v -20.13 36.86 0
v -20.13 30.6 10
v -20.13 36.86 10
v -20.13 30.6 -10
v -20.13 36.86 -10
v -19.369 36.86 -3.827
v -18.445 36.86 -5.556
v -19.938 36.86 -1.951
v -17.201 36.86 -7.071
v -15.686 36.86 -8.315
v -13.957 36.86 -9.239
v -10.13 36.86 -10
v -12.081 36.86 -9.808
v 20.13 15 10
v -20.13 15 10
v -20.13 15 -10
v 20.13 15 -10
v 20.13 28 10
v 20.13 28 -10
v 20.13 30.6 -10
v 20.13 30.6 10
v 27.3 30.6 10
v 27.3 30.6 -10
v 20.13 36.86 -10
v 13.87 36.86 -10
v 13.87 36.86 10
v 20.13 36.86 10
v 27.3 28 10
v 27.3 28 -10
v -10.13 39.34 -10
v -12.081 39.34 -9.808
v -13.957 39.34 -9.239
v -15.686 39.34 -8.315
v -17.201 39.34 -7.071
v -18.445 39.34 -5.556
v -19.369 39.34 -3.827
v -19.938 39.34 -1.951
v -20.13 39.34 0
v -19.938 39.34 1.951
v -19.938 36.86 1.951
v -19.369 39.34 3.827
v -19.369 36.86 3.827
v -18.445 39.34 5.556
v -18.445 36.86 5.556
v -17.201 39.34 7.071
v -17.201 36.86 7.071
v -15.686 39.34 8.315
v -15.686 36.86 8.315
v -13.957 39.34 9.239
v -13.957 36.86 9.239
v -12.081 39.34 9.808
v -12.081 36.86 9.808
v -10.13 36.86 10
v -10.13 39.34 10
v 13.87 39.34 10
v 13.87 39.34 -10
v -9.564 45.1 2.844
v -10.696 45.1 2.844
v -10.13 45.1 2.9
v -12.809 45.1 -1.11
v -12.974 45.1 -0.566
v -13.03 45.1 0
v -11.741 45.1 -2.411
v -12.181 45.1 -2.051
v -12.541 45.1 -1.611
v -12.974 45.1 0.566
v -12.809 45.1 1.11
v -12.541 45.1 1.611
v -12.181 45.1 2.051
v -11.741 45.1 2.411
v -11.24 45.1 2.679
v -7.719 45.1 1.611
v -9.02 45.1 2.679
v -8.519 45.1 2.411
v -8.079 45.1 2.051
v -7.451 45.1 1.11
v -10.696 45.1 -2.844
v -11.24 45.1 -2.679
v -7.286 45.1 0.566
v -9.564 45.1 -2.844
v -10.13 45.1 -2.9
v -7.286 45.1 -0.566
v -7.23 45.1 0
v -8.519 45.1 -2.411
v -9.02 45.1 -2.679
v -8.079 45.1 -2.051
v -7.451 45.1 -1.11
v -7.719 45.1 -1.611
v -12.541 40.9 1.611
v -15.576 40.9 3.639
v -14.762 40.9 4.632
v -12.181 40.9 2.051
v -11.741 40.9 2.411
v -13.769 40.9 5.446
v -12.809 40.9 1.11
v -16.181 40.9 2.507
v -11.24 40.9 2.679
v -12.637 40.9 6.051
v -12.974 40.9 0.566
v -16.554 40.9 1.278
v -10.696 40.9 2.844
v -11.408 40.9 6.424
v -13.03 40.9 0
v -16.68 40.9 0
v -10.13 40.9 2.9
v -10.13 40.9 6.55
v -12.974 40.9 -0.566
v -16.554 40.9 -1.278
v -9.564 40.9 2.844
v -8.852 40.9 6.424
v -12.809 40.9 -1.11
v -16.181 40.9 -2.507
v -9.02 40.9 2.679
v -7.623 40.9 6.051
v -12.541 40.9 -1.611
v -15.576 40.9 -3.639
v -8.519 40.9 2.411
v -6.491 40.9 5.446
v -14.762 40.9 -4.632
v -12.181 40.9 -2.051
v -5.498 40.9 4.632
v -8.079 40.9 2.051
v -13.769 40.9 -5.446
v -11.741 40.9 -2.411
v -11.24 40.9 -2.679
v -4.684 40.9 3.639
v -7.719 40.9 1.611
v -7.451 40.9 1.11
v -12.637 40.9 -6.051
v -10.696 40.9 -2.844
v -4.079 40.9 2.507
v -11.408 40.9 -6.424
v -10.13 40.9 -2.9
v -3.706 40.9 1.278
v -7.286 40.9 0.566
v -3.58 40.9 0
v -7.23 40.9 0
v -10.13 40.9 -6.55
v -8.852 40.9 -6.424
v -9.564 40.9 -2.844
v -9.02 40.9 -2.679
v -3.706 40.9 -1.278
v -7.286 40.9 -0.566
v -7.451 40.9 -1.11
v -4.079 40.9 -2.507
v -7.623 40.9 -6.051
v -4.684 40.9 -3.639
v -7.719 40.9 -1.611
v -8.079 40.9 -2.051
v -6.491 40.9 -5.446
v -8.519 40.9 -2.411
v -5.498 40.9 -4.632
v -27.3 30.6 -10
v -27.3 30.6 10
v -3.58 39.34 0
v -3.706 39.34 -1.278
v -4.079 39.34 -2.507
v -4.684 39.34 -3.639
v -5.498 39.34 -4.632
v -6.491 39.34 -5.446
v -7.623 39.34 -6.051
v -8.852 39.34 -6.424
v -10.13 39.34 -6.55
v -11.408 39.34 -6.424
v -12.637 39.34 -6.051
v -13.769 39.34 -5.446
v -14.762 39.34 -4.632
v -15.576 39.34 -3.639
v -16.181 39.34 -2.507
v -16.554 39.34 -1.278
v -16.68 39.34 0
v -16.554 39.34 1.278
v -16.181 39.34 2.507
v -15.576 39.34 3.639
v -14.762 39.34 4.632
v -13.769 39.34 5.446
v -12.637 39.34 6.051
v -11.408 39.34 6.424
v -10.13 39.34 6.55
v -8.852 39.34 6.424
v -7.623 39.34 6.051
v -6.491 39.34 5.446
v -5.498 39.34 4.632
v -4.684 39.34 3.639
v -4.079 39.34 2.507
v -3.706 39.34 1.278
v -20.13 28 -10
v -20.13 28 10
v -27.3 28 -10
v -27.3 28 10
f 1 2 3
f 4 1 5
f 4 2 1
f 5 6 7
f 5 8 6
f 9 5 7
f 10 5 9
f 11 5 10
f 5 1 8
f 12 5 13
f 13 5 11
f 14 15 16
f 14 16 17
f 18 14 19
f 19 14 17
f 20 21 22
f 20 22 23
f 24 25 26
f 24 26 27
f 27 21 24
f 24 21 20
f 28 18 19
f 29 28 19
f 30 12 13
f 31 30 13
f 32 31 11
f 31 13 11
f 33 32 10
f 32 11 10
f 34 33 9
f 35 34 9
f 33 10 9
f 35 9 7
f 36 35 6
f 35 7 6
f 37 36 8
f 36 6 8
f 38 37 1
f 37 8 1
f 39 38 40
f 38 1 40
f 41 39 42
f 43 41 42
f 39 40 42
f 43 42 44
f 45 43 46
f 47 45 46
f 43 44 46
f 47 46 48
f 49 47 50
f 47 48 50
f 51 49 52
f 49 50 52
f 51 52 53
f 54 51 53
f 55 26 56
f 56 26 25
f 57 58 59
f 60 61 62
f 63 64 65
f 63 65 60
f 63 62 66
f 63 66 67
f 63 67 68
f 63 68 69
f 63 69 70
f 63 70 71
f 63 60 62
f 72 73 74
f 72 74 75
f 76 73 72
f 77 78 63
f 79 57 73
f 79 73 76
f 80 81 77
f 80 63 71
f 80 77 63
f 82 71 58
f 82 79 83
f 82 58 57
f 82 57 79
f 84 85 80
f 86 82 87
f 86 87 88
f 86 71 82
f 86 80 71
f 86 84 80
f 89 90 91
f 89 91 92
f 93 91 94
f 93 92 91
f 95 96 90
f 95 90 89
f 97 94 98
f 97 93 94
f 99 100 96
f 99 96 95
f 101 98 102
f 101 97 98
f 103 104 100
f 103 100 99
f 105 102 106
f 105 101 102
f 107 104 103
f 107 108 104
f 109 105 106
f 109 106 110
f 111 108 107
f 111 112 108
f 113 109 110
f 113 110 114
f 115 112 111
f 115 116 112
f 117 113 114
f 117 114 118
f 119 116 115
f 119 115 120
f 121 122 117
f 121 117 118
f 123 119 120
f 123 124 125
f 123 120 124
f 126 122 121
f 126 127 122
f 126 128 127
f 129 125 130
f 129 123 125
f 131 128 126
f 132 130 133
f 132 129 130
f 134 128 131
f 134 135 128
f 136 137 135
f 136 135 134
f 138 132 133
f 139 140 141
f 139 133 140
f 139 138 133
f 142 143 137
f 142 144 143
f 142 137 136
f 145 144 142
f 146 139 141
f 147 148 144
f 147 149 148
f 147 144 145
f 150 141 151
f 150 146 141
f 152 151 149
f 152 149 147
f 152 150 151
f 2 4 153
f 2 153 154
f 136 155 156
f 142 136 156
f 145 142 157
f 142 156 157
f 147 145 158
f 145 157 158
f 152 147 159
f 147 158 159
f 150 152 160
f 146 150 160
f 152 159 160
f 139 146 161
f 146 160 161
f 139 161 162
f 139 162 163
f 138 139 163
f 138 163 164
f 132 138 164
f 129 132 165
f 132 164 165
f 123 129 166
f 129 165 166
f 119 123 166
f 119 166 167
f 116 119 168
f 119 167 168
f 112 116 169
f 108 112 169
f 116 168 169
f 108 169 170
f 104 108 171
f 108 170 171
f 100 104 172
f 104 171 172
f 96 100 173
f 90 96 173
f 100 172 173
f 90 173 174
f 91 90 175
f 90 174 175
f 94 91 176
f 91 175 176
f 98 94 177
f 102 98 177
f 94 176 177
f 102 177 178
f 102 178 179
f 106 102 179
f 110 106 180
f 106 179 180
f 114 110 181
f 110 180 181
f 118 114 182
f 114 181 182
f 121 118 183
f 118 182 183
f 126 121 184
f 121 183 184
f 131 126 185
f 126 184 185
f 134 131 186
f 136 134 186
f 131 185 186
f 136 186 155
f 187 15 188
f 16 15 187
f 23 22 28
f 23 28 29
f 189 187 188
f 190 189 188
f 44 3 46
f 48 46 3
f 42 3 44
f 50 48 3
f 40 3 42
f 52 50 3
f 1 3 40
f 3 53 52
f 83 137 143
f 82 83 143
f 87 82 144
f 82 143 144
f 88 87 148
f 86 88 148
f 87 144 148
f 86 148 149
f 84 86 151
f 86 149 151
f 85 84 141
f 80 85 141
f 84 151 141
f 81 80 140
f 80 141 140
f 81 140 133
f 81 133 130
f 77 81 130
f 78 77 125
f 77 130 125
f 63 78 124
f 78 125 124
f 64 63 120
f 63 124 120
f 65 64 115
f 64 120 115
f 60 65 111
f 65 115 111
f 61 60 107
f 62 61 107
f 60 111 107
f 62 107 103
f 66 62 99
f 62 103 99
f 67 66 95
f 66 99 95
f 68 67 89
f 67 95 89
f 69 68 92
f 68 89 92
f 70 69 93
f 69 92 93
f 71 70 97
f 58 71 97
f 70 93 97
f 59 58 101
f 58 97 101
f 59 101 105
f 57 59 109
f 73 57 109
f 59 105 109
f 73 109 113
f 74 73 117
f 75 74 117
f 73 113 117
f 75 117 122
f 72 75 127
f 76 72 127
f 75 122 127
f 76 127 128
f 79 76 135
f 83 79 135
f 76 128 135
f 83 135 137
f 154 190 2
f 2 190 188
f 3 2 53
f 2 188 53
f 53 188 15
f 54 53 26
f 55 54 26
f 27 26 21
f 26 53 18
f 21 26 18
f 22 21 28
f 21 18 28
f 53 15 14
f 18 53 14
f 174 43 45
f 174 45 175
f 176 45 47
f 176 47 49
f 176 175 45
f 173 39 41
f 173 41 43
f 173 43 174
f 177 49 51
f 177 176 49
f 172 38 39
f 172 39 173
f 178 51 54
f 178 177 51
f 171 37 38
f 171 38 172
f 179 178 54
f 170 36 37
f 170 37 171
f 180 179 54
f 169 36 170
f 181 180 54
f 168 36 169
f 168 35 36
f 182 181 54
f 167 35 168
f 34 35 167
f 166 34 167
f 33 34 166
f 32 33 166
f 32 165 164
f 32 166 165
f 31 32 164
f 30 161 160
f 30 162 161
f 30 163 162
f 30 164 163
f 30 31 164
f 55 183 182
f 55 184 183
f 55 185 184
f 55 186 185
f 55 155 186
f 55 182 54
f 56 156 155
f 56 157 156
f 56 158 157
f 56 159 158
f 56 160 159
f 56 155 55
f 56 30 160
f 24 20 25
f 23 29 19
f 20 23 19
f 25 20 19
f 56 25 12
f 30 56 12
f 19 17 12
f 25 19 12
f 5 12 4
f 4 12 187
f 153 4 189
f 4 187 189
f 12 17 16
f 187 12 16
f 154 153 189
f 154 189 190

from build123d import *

# Parameters (mm, degrees)
SKETCH1_W           = 40.26
SKETCH1_H           = 20
BOSS_EXTRUDE1_DEPTH = 36.86
SKETCH2_W           = 20
SKETCH2_H           = 2.6
BOSS_EXTRUDE2_DEPTH = 7.17
SKETCH3_W           = 20
SKETCH3_H           = 2.6
BOSS_EXTRUDE3_DEPTH = 7.17
SKETCH4_R           = 10
BOSS_EXTRUDE4_DEPTH = 2.48
SKETCH5_R           = 6.55
BOSS_EXTRUDE5_DEPTH = 1.56
SKETCH6_R           = 2.9
BOSS_EXTRUDE6_DEPTH = 4.2
SKETCH7_W           = 40.26
SKETCH7_H           = 20
CUT_EXTRUDE1_DEPTH  = 15


with BuildPart() as part:
    # Sketch1 → Boss-Extrude1 (new body)
    with BuildSketch(Plane(origin=(0, 0, 0), x_dir=(1, 0, 0), z_dir=(0, 1, 0))):
        Rectangle(SKETCH1_W, SKETCH1_H)
    extrude(amount=BOSS_EXTRUDE1_DEPTH)

    # Sketch2 → Boss-Extrude2 (add)
    with BuildSketch(Plane(origin=(20.13, 0, 0), x_dir=(0, 0, -1), z_dir=(1, 0, 0))):
        with Locations((0, 29.3)):
            Rectangle(SKETCH2_W, SKETCH2_H)
    extrude(amount=BOSS_EXTRUDE2_DEPTH)

    # Sketch3 → Boss-Extrude3 (add)
    with BuildSketch(Plane.ZY.offset(20.13)):
        with Locations((0, 29.3)):
            Rectangle(SKETCH3_W, SKETCH3_H)
    extrude(amount=BOSS_EXTRUDE3_DEPTH)

    # Sketch4 → Boss-Extrude4 (add)
    with BuildSketch(Plane(origin=(0, 36.86, 0), x_dir=(1, 0, 0), z_dir=(0, 1, 0))):
        with Locations((-10.13, 0)):
            Circle(SKETCH4_R)
        with BuildLine():
            Line((13.87, 10), (-10.13, 10))
            ThreePointArc((-10.13, 10), (-3.058932188, 7.071067812), (-0.13, 0))
            ThreePointArc((-0.13, 0), (-3.058932188, -7.071067812), (-10.13, -10))
            Line((-10.13, -10), (13.87, -10))
            Line((13.87, -10), (13.87, 10))
        make_face()
    extrude(amount=BOSS_EXTRUDE4_DEPTH)

    # Sketch5 → Boss-Extrude5 (add)
    with BuildSketch(Plane(origin=(0, 39.34, 0), x_dir=(1, 0, 0), z_dir=(0, 1, 0))):
        with Locations((-10.13, 0)):
            Circle(SKETCH5_R)
    extrude(amount=BOSS_EXTRUDE5_DEPTH)

    # Sketch6 → Boss-Extrude6 (add)
    with BuildSketch(Plane(origin=(0, 40.9, 0), x_dir=(1, 0, 0), z_dir=(0, 1, 0))):
        with Locations((-10.13, 0)):
            Circle(SKETCH6_R)
    extrude(amount=BOSS_EXTRUDE6_DEPTH)

    # Sketch7 → Cut-Extrude1 (cut)
    with BuildSketch(Plane.XZ):
        Rectangle(SKETCH7_W, SKETCH7_H)
    extrude(amount=-CUT_EXTRUDE1_DEPTH, mode=Mode.SUBTRACT)


solid = part.part
